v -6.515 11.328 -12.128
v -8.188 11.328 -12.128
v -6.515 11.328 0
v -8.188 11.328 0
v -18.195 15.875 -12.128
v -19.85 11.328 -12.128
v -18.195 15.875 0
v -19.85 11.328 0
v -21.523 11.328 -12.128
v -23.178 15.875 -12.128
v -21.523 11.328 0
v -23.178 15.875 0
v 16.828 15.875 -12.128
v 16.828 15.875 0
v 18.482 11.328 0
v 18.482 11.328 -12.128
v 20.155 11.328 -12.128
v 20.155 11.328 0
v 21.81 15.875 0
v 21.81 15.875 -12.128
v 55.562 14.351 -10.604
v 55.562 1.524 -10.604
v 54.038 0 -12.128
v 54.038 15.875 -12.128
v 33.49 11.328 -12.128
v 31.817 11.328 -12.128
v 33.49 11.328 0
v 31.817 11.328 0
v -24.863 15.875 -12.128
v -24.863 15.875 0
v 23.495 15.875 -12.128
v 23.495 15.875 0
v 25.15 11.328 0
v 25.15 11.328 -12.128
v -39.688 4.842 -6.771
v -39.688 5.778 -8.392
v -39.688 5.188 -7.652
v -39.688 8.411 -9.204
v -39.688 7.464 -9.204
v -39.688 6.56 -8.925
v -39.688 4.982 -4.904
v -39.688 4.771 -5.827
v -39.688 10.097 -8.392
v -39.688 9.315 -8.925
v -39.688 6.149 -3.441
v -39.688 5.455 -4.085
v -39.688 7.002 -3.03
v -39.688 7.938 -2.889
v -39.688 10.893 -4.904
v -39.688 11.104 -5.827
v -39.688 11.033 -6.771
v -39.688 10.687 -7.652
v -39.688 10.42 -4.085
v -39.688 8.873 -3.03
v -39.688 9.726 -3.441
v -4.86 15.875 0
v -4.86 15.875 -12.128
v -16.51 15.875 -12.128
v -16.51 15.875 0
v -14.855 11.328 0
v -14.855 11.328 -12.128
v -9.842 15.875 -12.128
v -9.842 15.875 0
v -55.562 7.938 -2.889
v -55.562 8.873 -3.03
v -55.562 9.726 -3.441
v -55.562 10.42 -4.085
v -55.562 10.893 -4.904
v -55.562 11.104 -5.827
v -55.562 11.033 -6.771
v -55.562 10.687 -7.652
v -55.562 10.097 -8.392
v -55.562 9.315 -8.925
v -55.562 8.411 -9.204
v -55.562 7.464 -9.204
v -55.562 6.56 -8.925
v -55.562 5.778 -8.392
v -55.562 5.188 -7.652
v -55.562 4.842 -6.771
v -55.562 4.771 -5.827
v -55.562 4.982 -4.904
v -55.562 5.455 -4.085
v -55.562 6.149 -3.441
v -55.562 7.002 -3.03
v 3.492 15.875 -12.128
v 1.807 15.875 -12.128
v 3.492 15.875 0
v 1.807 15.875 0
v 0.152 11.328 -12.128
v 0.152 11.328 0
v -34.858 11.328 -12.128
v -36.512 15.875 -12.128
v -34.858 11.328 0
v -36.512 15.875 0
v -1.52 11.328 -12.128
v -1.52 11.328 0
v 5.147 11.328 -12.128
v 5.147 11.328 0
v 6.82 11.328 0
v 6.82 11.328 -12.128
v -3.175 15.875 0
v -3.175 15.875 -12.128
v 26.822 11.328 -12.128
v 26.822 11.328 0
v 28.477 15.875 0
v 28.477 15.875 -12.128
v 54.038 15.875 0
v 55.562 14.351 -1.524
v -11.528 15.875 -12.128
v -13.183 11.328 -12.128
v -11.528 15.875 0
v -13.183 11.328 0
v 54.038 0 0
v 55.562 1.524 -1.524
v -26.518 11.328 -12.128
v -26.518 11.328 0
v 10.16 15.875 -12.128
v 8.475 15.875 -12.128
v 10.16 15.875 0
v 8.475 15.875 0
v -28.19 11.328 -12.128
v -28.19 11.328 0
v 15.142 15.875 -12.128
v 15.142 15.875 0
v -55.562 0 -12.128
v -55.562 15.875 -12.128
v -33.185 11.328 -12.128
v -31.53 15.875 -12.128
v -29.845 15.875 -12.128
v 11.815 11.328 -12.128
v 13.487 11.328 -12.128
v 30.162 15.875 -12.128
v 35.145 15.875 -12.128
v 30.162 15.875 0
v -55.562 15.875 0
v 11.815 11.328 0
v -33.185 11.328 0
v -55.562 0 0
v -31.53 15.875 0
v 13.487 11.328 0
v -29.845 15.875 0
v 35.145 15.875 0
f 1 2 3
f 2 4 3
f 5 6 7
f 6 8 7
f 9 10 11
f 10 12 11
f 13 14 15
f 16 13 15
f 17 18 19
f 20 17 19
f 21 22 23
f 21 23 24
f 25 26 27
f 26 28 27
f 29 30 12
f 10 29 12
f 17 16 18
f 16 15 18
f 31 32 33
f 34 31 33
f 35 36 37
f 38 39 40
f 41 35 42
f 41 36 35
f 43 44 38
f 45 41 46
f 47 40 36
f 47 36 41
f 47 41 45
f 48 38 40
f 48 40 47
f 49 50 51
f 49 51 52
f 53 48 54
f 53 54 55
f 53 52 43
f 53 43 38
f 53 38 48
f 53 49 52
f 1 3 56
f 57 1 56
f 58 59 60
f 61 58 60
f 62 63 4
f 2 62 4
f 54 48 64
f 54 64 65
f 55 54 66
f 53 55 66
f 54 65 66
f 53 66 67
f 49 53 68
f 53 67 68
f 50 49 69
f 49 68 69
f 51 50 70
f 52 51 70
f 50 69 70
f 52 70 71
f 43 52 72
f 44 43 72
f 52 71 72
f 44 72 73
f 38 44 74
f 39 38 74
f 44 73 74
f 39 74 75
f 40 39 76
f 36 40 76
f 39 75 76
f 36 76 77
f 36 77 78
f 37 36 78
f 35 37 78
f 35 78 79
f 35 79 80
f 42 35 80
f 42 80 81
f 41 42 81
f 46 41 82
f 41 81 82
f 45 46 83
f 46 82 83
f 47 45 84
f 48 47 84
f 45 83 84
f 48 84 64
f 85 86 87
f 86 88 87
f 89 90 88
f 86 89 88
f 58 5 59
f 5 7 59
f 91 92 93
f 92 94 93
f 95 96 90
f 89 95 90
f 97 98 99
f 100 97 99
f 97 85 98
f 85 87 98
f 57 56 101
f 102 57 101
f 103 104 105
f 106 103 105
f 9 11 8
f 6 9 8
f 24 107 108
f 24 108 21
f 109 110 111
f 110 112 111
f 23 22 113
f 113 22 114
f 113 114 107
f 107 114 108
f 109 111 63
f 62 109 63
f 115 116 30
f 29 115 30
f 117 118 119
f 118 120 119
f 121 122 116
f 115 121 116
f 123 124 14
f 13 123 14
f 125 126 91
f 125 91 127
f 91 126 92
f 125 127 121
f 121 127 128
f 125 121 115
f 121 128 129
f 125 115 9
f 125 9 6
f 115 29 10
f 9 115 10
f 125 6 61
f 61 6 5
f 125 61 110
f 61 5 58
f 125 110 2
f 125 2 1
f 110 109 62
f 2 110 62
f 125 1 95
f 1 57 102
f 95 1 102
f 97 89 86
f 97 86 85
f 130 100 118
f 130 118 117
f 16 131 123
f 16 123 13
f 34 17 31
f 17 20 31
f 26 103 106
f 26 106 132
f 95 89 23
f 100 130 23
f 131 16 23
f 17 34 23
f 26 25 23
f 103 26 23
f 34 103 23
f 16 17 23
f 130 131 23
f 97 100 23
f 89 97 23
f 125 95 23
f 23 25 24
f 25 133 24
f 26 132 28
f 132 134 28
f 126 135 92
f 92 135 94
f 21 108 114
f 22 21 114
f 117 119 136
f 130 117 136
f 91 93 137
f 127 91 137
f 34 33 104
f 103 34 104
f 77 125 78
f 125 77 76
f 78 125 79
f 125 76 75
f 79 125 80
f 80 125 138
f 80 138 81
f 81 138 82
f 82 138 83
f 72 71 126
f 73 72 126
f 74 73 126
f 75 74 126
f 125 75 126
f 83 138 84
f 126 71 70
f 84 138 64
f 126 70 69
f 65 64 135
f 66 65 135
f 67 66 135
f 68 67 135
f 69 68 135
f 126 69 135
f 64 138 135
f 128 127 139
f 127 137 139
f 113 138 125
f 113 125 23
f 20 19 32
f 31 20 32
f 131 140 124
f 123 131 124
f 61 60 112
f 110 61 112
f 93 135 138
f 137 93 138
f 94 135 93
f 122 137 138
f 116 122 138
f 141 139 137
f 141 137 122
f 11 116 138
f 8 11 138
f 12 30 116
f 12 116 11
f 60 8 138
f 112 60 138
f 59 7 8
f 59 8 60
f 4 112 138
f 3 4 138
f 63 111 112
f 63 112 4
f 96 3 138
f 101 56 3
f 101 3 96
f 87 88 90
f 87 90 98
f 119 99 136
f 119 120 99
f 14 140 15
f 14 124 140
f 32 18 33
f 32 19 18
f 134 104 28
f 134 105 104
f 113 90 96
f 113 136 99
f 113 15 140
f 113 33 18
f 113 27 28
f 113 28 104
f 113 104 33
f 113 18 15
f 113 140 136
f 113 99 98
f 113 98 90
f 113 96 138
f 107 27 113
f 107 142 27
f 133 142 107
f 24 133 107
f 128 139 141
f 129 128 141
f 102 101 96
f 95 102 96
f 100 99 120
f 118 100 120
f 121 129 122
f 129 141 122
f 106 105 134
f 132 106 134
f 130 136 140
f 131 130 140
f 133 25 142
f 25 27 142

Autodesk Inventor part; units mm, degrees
ref_plane "YZ Plane" through (0, 0, 0) normal (1, 0, 0) x (0, 1, 0)
ref_plane "XZ Plane" through (0, 0, 0) normal (0, 1, 0) x (-1, 0, 0)
ref_plane "XY Plane" through (0, 0, 0) normal (0, 0, 1) x (1, 0, 0)
sketch "Sketch1" plane through (0, 0, 0) normal (0, 0, 1) x (1, 0, 0)
  line L0 (-77.7875, 0) -> (77.7875, 0) projected
  line L1 (0, -3.175) -> (0, 19.05) projected
  line L2 (-55.5625, 0) -> (55.5625, 0)
  line L3 (-55.5625, 0) -> (-55.5625, 15.875)
  line L4 (-55.5625, 15.875) -> (55.5625, 15.875)
  line L5 (55.5625, 15.875) -> (55.5625, 0)
  point P0 (0, 0)
  point P1 (0, 0)
  dimension "d0" = 111.125
  dimension "d1" = 15.875
extrude "Extrusion1" add sketch "Sketch1" against normal blind 12.1285
sketch "Sketch2" plane through (0, 0, 0) normal (0, 0, 1) x (1, 0, 0)
  line L0 (-55.5625, 15.875) -> (55.5625, 15.875) projected
  line L1 (-55.5625, 15.875) -> (-36.5125, 15.875)
  line L2 (-36.5125, 15.875) -> (-34.8577, 11.3284)
  line L3 (-34.8577, 11.3284) -> (-33.1851, 11.3284)
  line L4 (-33.1851, 11.3284) -> (-31.5303, 15.875)
  line L5 (-31.5303, 15.875) -> (-29.8577, 15.875)
  line L6 (55.5625, 15.875) -> (-55.5625, 15.875) construction
  line L7 (-55.5625, 15.875) -> (-55.5625, 0) projected
  line L8 (55.5625, 15.875) -> (36.5125, 15.875)
  line L9 (-29.845, 15.875) -> (-28.1902, 11.3284)
  line L10 (-28.1902, 11.3284) -> (-26.5176, 11.3284)
  line L11 (-26.5176, 11.3284) -> (-24.8628, 15.875)
  line L12 (-24.8628, 15.875) -> (-23.1902, 15.875)
  line L13 (-23.1775, 15.875) -> (-21.5227, 11.3284)
  line L14 (-21.5227, 11.3284) -> (-19.8501, 11.3284)
  line L15 (-19.8501, 11.3284) -> (-18.1953, 15.875)
  line L16 (-18.1953, 15.875) -> (-16.5227, 15.875)
  line L17 (-16.51, 15.875) -> (-14.8552, 11.3284)
  line L18 (-14.8552, 11.3284) -> (-13.1826, 11.3284)
  line L19 (-13.1826, 11.3284) -> (-11.5278, 15.875)
  line L20 (-11.5278, 15.875) -> (-9.8552, 15.875)
  line L21 (-9.8425, 15.875) -> (-8.1877, 11.3284)
  line L22 (-8.1877, 11.3284) -> (-6.5151, 11.3284)
  line L23 (-6.5151, 11.3284) -> (-4.8603, 15.875)
  line L24 (-4.8603, 15.875) -> (-3.1877, 15.875)
  line L25 (-3.175, 15.875) -> (-1.5202, 11.3284)
  line L26 (-1.5202, 11.3284) -> (0.1524, 11.3284)
  line L27 (0.1524, 11.3284) -> (1.8072, 15.875)
  line L28 (1.8072, 15.875) -> (3.4798, 15.875)
  line L29 (3.4925, 15.875) -> (5.1473, 11.3284)
  line L30 (5.1473, 11.3284) -> (6.8199, 11.3284)
  line L31 (6.8199, 11.3284) -> (8.4747, 15.875)
  line L32 (8.4747, 15.875) -> (10.1473, 15.875)
  line L33 (10.16, 15.875) -> (11.8148, 11.3284)
  line L34 (11.8148, 11.3284) -> (13.4874, 11.3284)
  line L35 (13.4874, 11.3284) -> (15.1422, 15.875)
  line L36 (15.1422, 15.875) -> (16.8148, 15.875)
  line L37 (16.8275, 15.875) -> (18.4823, 11.3284)
  line L38 (18.4823, 11.3284) -> (20.1549, 11.3284)
  line L39 (20.1549, 11.3284) -> (21.8097, 15.875)
  line L40 (21.8097, 15.875) -> (23.4823, 15.875)
  line L41 (23.495, 15.875) -> (25.1498, 11.3284)
  line L42 (25.1498, 11.3284) -> (26.8224, 11.3284)
  line L43 (26.8224, 11.3284) -> (28.4772, 15.875)
  line L44 (28.4772, 15.875) -> (30.1498, 15.875)
  line L45 (30.1625, 15.875) -> (31.8173, 11.3284)
  line L46 (31.8173, 11.3284) -> (33.4899, 11.3284)
  line L47 (33.4899, 11.3284) -> (35.1447, 15.875)
  line L48 (35.1447, 15.875) -> (36.8173, 15.875)
  point P0 (0, 0)
  point P1 (-35.6851, 13.6017)
  point P2 (-32.3577, 13.6017)
  point P3 (-29.0176, 13.6017)
  point P4 (-25.6902, 13.6017)
  point P5 (-22.3501, 13.6017)
  point P6 (-19.0227, 13.6017)
  point P7 (-15.6826, 13.6017)
  point P8 (-12.3552, 13.6017)
  point P9 (-9.0151, 13.6017)
  point P10 (-5.6877, 13.6017)
  point P11 (-2.3476, 13.6017)
  point P12 (0.9798, 13.6017)
  point P13 (4.3199, 13.6017)
  point P14 (7.6473, 13.6017)
  point P15 (10.9874, 13.6017)
  point P16 (14.3148, 13.6017)
  point P17 (17.6549, 13.6017)
  point P18 (20.9823, 13.6017)
  point P19 (24.3224, 13.6017)
  point P20 (27.6498, 13.6017)
  point P21 (30.9899, 13.6017)
  point P22 (34.3173, 13.6017)
  dimension "d4" = 19.05
  dimension "d5" = 6.6548
  dimension "d6" = 20
  dimension "d7" = 4.5466
  dimension "d12" = 6.6675
extrude "Extrusion2" cut sketch "Sketch2" against normal through all
sketch "Sketch3" plane through (-55.5625, 0, 0) normal (-1, 0, 0) x (0, 0, 1)
  circle A0 centre (-6.0642, 7.9375) radius 3.175
  line L0 (-12.1285, 0) -> (-12.1285, 15.875) projected
  line L1 (0, 15.875) -> (-12.1285, 15.875) projected
  point P0 (0, 0)
  point P1 (-12.1285, 7.9375)
  point P2 (-6.0642, 15.875)
  dimension "d19" = 6.35
extrude "Extrusion3" cut sketch "Sketch3" against normal blind 15.875
chamfer "Chamfer1" distance 1.524 angle 45 4 edges at (55.5625, 15.875, -6.0642) (55.5625, 7.9375, 0) (55.5625, 0, -6.0642) (55.5625, 7.9375, -12.1285)
properties part number "Ch7(5) Part 11 Rack"
